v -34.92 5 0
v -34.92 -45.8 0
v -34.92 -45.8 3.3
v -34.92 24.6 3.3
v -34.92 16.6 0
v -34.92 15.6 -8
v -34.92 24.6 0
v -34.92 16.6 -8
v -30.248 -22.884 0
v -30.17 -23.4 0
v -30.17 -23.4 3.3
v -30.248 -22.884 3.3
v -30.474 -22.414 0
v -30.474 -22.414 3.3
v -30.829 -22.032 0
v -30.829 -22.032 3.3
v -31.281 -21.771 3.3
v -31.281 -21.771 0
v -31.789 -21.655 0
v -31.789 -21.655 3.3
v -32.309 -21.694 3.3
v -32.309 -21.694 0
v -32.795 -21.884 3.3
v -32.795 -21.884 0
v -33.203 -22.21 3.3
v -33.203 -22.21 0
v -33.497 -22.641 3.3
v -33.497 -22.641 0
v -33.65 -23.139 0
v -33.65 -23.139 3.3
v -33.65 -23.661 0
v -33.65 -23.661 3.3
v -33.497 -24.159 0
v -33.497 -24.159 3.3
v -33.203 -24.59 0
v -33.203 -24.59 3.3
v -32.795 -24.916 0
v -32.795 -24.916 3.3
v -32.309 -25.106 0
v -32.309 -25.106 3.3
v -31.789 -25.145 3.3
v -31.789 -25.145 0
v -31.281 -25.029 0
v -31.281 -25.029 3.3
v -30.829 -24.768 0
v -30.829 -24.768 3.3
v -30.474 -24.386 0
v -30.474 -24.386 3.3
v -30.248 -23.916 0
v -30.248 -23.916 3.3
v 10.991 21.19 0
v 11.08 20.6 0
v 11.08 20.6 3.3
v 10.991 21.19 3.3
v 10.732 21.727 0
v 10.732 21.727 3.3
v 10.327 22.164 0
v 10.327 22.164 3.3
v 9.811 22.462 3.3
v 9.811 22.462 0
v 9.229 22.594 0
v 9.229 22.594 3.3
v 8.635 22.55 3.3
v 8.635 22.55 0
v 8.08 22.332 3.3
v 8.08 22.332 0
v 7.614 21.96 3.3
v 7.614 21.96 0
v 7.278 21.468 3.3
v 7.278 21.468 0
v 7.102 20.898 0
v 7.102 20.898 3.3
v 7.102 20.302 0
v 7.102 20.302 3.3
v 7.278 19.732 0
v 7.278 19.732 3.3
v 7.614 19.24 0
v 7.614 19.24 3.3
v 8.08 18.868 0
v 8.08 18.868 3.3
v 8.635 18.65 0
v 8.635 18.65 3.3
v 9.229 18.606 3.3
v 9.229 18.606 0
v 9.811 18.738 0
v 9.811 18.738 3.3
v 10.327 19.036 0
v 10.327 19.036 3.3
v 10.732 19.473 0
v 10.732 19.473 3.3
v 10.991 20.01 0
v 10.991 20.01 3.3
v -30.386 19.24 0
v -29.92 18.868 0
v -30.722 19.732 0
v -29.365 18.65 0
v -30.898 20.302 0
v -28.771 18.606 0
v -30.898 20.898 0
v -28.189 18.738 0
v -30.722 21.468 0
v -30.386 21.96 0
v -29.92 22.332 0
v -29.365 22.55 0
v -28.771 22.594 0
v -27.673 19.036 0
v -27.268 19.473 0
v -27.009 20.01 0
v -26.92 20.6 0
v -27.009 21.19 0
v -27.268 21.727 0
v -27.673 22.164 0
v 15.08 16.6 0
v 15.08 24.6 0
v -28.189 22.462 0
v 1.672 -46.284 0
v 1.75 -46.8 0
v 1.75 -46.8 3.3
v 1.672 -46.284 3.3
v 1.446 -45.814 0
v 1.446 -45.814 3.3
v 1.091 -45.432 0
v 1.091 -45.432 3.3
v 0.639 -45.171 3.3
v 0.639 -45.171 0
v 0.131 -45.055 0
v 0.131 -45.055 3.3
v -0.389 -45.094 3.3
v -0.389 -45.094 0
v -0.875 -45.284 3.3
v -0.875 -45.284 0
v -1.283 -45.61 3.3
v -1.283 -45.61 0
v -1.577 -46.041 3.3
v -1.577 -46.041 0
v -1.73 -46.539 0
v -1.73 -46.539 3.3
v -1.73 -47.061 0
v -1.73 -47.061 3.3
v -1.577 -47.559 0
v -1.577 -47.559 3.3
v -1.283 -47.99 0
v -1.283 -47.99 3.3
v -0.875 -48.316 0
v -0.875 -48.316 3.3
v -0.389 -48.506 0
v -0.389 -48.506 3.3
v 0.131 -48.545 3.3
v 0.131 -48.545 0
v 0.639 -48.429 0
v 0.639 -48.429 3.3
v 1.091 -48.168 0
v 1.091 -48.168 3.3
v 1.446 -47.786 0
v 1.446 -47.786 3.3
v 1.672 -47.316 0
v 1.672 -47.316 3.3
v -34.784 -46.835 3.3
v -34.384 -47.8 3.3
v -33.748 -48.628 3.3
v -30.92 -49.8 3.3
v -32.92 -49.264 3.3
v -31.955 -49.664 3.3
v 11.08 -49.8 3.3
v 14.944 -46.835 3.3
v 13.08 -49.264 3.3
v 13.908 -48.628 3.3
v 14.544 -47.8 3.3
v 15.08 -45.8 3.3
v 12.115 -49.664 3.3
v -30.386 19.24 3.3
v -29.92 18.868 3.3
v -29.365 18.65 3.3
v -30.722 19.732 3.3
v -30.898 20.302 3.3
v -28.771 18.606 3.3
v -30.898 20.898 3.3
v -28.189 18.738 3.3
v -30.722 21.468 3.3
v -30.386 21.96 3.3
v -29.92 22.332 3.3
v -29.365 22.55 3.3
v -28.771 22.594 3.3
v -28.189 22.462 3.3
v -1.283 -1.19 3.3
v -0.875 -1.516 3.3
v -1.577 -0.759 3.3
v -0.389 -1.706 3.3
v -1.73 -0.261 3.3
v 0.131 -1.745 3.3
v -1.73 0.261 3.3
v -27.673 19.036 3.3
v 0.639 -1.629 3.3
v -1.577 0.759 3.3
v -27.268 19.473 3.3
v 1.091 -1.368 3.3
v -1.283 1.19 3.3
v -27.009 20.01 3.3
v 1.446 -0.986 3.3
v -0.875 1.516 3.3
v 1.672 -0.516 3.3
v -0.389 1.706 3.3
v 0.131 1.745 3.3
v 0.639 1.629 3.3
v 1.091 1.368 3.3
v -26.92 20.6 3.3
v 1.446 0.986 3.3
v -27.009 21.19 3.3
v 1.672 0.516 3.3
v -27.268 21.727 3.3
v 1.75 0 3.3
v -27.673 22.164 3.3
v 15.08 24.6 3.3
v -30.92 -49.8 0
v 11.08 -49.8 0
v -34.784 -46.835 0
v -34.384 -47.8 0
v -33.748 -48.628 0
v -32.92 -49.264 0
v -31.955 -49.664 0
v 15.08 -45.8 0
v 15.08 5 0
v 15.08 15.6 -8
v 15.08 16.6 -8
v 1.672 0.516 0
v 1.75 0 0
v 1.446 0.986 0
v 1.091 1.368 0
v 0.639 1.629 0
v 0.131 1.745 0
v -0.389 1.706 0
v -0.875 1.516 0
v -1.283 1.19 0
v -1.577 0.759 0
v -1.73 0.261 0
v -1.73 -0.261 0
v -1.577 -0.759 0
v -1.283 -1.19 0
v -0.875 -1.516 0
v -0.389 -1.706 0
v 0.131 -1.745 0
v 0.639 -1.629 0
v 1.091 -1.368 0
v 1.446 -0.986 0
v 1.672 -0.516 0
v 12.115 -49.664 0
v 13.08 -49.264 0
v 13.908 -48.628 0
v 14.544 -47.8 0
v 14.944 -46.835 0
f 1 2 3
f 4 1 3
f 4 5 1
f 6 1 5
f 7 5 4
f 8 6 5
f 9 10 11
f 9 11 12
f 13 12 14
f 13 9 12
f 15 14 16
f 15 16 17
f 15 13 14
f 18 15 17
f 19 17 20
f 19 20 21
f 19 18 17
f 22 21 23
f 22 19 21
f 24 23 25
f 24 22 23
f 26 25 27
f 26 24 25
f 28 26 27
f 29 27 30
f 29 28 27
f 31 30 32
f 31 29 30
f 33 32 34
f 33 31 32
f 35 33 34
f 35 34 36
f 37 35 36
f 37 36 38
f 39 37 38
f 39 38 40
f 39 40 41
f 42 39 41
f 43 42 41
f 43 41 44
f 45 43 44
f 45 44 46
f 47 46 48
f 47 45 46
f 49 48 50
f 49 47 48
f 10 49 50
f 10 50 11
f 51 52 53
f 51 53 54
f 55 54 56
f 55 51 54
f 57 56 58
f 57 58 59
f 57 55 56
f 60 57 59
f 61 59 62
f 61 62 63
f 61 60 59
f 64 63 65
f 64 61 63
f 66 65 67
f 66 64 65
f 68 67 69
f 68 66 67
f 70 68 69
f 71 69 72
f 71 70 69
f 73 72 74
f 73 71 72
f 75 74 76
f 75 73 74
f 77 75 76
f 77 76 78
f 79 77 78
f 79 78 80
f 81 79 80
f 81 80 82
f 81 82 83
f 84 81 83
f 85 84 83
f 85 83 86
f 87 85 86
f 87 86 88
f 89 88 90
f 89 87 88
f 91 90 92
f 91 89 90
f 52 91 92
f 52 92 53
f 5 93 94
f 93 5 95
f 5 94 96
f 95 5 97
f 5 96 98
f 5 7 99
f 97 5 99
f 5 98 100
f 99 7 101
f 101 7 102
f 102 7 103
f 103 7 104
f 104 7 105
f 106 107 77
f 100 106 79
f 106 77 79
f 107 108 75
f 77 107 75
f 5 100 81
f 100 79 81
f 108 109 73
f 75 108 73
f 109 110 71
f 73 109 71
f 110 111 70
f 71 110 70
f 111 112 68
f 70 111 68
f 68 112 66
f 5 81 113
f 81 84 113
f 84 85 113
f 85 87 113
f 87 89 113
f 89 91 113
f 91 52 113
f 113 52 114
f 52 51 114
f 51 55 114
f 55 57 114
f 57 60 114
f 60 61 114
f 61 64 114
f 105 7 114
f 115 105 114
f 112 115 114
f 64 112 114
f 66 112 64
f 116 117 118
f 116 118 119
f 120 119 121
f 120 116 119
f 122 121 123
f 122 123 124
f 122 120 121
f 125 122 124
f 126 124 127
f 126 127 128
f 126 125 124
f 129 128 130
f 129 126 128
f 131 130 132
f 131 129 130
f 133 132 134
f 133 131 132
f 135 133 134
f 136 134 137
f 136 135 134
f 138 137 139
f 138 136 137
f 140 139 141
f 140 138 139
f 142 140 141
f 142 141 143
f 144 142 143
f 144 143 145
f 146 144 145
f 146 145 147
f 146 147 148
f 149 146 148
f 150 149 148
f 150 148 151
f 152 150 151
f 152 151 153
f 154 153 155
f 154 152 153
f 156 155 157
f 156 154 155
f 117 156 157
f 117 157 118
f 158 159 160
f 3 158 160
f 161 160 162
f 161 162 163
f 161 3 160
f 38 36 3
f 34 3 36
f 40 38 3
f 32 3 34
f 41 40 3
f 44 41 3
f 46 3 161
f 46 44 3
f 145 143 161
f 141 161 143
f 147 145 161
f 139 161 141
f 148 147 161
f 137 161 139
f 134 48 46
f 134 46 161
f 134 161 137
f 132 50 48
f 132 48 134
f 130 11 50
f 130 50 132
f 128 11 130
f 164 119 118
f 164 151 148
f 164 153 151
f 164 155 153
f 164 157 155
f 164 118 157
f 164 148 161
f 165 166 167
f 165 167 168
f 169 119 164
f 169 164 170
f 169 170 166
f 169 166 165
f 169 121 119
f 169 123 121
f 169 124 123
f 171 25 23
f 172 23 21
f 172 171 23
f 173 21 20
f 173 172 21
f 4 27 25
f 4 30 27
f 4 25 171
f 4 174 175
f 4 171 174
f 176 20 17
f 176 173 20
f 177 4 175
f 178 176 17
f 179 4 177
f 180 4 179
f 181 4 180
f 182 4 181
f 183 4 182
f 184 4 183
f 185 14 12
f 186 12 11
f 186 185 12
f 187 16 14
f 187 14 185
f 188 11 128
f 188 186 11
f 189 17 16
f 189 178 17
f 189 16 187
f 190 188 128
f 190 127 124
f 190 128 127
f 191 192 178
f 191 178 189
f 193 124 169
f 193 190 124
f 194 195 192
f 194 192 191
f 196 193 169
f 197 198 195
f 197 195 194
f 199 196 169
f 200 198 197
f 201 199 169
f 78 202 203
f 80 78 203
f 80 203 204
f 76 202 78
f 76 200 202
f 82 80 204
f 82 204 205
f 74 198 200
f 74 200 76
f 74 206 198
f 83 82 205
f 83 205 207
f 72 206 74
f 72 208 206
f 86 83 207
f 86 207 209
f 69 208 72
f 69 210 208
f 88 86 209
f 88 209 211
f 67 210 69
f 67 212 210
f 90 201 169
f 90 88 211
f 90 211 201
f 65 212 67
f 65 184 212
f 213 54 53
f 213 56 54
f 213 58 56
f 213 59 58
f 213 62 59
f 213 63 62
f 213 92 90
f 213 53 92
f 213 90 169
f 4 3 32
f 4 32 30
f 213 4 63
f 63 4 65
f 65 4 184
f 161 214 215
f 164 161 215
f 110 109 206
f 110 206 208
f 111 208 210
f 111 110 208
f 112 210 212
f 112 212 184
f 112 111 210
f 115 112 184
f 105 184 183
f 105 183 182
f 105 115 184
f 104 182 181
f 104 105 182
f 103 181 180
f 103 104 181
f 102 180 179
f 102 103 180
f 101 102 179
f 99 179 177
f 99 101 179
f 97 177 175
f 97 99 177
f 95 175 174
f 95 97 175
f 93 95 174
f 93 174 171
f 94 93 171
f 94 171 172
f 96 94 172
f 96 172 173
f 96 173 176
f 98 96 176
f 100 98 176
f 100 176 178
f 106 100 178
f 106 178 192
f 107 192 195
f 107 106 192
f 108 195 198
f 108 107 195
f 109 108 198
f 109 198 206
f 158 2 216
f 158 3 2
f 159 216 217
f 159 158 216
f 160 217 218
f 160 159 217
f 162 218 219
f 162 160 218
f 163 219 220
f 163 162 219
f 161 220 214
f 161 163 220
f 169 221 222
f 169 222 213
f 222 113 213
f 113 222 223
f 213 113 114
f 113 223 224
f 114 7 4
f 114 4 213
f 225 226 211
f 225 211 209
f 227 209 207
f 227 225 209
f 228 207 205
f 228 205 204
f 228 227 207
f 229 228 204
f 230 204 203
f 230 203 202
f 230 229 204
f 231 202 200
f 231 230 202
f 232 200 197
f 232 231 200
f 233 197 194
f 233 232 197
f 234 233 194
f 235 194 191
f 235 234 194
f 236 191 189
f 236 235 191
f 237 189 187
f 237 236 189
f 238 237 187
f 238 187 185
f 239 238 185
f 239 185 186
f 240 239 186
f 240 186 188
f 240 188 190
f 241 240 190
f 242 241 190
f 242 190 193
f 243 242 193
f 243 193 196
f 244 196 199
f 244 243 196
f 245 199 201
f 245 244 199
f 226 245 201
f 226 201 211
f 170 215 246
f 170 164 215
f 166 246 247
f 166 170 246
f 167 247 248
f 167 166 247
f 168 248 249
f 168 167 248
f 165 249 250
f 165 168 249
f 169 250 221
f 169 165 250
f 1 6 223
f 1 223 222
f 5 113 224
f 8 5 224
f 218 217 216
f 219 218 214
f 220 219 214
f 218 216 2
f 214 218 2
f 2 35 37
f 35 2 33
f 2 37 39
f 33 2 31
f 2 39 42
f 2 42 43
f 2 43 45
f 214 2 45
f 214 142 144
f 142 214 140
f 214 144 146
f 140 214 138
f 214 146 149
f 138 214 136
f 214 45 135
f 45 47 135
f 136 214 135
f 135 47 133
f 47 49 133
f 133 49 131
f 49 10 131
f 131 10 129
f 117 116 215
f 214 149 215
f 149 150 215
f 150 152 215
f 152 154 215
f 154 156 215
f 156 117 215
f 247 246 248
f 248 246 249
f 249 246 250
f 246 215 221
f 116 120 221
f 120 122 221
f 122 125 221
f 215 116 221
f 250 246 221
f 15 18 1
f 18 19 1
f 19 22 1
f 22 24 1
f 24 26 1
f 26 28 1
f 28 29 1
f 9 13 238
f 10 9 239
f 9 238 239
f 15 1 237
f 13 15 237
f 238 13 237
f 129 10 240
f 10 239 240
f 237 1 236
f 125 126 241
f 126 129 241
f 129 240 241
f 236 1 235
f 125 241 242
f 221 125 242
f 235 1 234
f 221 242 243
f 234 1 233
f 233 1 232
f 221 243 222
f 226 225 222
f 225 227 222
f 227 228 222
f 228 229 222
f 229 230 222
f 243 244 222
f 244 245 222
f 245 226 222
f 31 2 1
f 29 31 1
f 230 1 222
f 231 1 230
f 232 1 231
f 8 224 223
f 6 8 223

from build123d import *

# Parameters (mm, degrees)
SKETCH_1_W      = 50
SKETCH_1_H      = 74.4
SKETCH_1_R      = 1.75
SKETCH_1_R_2    = 2
EXTRUDE_2_DEPTH = 3.3
FILLET_1_R      = 4
EXTRUDE_3_DEPTH = 50


with BuildPart() as part:
    # ｽｹｯﾁ1 → ﾎﾞｽ - 押し出し2 (new body)
    with BuildSketch(Plane.XY):
        with Locations((-9.92, -12.6)):
            Rectangle(SKETCH_1_W, SKETCH_1_H)
        Circle(SKETCH_1_R, mode=Mode.SUBTRACT)
        with Locations((0, -46.8)):
            Circle(SKETCH_1_R, mode=Mode.SUBTRACT)
        with Locations((-31.92, -23.4)):
            Circle(SKETCH_1_R, mode=Mode.SUBTRACT)
        with Locations((9.08, 20.6)):
            Circle(SKETCH_1_R_2, mode=Mode.SUBTRACT)
        with Locations((-28.92, 20.6)):
            Circle(SKETCH_1_R_2, mode=Mode.SUBTRACT)
    extrude(amount=EXTRUDE_2_DEPTH)

    # ﾌｨﾚｯﾄ1
    fillet_1_edges = [part.edges().sort_by_distance(p)[0] for p in [
        (15.08, -49.8, 1.65),
        (-34.92, -49.8, 1.65),
    ]]
    fillet(fillet_1_edges, radius=FILLET_1_R)

    # ｽｹｯﾁ3 → ﾎﾞｽ - 押し出し3 (add)
    with BuildSketch(Plane(origin=(15.08, 0, 0), x_dir=(0, 0, -1), z_dir=(1, 0, 0))):
        Polygon((0, 16.6), (8, 16.6), (8, 15.6), (0, 5), align=None)
    extrude(amount=-EXTRUDE_3_DEPTH)


solid = part.part
